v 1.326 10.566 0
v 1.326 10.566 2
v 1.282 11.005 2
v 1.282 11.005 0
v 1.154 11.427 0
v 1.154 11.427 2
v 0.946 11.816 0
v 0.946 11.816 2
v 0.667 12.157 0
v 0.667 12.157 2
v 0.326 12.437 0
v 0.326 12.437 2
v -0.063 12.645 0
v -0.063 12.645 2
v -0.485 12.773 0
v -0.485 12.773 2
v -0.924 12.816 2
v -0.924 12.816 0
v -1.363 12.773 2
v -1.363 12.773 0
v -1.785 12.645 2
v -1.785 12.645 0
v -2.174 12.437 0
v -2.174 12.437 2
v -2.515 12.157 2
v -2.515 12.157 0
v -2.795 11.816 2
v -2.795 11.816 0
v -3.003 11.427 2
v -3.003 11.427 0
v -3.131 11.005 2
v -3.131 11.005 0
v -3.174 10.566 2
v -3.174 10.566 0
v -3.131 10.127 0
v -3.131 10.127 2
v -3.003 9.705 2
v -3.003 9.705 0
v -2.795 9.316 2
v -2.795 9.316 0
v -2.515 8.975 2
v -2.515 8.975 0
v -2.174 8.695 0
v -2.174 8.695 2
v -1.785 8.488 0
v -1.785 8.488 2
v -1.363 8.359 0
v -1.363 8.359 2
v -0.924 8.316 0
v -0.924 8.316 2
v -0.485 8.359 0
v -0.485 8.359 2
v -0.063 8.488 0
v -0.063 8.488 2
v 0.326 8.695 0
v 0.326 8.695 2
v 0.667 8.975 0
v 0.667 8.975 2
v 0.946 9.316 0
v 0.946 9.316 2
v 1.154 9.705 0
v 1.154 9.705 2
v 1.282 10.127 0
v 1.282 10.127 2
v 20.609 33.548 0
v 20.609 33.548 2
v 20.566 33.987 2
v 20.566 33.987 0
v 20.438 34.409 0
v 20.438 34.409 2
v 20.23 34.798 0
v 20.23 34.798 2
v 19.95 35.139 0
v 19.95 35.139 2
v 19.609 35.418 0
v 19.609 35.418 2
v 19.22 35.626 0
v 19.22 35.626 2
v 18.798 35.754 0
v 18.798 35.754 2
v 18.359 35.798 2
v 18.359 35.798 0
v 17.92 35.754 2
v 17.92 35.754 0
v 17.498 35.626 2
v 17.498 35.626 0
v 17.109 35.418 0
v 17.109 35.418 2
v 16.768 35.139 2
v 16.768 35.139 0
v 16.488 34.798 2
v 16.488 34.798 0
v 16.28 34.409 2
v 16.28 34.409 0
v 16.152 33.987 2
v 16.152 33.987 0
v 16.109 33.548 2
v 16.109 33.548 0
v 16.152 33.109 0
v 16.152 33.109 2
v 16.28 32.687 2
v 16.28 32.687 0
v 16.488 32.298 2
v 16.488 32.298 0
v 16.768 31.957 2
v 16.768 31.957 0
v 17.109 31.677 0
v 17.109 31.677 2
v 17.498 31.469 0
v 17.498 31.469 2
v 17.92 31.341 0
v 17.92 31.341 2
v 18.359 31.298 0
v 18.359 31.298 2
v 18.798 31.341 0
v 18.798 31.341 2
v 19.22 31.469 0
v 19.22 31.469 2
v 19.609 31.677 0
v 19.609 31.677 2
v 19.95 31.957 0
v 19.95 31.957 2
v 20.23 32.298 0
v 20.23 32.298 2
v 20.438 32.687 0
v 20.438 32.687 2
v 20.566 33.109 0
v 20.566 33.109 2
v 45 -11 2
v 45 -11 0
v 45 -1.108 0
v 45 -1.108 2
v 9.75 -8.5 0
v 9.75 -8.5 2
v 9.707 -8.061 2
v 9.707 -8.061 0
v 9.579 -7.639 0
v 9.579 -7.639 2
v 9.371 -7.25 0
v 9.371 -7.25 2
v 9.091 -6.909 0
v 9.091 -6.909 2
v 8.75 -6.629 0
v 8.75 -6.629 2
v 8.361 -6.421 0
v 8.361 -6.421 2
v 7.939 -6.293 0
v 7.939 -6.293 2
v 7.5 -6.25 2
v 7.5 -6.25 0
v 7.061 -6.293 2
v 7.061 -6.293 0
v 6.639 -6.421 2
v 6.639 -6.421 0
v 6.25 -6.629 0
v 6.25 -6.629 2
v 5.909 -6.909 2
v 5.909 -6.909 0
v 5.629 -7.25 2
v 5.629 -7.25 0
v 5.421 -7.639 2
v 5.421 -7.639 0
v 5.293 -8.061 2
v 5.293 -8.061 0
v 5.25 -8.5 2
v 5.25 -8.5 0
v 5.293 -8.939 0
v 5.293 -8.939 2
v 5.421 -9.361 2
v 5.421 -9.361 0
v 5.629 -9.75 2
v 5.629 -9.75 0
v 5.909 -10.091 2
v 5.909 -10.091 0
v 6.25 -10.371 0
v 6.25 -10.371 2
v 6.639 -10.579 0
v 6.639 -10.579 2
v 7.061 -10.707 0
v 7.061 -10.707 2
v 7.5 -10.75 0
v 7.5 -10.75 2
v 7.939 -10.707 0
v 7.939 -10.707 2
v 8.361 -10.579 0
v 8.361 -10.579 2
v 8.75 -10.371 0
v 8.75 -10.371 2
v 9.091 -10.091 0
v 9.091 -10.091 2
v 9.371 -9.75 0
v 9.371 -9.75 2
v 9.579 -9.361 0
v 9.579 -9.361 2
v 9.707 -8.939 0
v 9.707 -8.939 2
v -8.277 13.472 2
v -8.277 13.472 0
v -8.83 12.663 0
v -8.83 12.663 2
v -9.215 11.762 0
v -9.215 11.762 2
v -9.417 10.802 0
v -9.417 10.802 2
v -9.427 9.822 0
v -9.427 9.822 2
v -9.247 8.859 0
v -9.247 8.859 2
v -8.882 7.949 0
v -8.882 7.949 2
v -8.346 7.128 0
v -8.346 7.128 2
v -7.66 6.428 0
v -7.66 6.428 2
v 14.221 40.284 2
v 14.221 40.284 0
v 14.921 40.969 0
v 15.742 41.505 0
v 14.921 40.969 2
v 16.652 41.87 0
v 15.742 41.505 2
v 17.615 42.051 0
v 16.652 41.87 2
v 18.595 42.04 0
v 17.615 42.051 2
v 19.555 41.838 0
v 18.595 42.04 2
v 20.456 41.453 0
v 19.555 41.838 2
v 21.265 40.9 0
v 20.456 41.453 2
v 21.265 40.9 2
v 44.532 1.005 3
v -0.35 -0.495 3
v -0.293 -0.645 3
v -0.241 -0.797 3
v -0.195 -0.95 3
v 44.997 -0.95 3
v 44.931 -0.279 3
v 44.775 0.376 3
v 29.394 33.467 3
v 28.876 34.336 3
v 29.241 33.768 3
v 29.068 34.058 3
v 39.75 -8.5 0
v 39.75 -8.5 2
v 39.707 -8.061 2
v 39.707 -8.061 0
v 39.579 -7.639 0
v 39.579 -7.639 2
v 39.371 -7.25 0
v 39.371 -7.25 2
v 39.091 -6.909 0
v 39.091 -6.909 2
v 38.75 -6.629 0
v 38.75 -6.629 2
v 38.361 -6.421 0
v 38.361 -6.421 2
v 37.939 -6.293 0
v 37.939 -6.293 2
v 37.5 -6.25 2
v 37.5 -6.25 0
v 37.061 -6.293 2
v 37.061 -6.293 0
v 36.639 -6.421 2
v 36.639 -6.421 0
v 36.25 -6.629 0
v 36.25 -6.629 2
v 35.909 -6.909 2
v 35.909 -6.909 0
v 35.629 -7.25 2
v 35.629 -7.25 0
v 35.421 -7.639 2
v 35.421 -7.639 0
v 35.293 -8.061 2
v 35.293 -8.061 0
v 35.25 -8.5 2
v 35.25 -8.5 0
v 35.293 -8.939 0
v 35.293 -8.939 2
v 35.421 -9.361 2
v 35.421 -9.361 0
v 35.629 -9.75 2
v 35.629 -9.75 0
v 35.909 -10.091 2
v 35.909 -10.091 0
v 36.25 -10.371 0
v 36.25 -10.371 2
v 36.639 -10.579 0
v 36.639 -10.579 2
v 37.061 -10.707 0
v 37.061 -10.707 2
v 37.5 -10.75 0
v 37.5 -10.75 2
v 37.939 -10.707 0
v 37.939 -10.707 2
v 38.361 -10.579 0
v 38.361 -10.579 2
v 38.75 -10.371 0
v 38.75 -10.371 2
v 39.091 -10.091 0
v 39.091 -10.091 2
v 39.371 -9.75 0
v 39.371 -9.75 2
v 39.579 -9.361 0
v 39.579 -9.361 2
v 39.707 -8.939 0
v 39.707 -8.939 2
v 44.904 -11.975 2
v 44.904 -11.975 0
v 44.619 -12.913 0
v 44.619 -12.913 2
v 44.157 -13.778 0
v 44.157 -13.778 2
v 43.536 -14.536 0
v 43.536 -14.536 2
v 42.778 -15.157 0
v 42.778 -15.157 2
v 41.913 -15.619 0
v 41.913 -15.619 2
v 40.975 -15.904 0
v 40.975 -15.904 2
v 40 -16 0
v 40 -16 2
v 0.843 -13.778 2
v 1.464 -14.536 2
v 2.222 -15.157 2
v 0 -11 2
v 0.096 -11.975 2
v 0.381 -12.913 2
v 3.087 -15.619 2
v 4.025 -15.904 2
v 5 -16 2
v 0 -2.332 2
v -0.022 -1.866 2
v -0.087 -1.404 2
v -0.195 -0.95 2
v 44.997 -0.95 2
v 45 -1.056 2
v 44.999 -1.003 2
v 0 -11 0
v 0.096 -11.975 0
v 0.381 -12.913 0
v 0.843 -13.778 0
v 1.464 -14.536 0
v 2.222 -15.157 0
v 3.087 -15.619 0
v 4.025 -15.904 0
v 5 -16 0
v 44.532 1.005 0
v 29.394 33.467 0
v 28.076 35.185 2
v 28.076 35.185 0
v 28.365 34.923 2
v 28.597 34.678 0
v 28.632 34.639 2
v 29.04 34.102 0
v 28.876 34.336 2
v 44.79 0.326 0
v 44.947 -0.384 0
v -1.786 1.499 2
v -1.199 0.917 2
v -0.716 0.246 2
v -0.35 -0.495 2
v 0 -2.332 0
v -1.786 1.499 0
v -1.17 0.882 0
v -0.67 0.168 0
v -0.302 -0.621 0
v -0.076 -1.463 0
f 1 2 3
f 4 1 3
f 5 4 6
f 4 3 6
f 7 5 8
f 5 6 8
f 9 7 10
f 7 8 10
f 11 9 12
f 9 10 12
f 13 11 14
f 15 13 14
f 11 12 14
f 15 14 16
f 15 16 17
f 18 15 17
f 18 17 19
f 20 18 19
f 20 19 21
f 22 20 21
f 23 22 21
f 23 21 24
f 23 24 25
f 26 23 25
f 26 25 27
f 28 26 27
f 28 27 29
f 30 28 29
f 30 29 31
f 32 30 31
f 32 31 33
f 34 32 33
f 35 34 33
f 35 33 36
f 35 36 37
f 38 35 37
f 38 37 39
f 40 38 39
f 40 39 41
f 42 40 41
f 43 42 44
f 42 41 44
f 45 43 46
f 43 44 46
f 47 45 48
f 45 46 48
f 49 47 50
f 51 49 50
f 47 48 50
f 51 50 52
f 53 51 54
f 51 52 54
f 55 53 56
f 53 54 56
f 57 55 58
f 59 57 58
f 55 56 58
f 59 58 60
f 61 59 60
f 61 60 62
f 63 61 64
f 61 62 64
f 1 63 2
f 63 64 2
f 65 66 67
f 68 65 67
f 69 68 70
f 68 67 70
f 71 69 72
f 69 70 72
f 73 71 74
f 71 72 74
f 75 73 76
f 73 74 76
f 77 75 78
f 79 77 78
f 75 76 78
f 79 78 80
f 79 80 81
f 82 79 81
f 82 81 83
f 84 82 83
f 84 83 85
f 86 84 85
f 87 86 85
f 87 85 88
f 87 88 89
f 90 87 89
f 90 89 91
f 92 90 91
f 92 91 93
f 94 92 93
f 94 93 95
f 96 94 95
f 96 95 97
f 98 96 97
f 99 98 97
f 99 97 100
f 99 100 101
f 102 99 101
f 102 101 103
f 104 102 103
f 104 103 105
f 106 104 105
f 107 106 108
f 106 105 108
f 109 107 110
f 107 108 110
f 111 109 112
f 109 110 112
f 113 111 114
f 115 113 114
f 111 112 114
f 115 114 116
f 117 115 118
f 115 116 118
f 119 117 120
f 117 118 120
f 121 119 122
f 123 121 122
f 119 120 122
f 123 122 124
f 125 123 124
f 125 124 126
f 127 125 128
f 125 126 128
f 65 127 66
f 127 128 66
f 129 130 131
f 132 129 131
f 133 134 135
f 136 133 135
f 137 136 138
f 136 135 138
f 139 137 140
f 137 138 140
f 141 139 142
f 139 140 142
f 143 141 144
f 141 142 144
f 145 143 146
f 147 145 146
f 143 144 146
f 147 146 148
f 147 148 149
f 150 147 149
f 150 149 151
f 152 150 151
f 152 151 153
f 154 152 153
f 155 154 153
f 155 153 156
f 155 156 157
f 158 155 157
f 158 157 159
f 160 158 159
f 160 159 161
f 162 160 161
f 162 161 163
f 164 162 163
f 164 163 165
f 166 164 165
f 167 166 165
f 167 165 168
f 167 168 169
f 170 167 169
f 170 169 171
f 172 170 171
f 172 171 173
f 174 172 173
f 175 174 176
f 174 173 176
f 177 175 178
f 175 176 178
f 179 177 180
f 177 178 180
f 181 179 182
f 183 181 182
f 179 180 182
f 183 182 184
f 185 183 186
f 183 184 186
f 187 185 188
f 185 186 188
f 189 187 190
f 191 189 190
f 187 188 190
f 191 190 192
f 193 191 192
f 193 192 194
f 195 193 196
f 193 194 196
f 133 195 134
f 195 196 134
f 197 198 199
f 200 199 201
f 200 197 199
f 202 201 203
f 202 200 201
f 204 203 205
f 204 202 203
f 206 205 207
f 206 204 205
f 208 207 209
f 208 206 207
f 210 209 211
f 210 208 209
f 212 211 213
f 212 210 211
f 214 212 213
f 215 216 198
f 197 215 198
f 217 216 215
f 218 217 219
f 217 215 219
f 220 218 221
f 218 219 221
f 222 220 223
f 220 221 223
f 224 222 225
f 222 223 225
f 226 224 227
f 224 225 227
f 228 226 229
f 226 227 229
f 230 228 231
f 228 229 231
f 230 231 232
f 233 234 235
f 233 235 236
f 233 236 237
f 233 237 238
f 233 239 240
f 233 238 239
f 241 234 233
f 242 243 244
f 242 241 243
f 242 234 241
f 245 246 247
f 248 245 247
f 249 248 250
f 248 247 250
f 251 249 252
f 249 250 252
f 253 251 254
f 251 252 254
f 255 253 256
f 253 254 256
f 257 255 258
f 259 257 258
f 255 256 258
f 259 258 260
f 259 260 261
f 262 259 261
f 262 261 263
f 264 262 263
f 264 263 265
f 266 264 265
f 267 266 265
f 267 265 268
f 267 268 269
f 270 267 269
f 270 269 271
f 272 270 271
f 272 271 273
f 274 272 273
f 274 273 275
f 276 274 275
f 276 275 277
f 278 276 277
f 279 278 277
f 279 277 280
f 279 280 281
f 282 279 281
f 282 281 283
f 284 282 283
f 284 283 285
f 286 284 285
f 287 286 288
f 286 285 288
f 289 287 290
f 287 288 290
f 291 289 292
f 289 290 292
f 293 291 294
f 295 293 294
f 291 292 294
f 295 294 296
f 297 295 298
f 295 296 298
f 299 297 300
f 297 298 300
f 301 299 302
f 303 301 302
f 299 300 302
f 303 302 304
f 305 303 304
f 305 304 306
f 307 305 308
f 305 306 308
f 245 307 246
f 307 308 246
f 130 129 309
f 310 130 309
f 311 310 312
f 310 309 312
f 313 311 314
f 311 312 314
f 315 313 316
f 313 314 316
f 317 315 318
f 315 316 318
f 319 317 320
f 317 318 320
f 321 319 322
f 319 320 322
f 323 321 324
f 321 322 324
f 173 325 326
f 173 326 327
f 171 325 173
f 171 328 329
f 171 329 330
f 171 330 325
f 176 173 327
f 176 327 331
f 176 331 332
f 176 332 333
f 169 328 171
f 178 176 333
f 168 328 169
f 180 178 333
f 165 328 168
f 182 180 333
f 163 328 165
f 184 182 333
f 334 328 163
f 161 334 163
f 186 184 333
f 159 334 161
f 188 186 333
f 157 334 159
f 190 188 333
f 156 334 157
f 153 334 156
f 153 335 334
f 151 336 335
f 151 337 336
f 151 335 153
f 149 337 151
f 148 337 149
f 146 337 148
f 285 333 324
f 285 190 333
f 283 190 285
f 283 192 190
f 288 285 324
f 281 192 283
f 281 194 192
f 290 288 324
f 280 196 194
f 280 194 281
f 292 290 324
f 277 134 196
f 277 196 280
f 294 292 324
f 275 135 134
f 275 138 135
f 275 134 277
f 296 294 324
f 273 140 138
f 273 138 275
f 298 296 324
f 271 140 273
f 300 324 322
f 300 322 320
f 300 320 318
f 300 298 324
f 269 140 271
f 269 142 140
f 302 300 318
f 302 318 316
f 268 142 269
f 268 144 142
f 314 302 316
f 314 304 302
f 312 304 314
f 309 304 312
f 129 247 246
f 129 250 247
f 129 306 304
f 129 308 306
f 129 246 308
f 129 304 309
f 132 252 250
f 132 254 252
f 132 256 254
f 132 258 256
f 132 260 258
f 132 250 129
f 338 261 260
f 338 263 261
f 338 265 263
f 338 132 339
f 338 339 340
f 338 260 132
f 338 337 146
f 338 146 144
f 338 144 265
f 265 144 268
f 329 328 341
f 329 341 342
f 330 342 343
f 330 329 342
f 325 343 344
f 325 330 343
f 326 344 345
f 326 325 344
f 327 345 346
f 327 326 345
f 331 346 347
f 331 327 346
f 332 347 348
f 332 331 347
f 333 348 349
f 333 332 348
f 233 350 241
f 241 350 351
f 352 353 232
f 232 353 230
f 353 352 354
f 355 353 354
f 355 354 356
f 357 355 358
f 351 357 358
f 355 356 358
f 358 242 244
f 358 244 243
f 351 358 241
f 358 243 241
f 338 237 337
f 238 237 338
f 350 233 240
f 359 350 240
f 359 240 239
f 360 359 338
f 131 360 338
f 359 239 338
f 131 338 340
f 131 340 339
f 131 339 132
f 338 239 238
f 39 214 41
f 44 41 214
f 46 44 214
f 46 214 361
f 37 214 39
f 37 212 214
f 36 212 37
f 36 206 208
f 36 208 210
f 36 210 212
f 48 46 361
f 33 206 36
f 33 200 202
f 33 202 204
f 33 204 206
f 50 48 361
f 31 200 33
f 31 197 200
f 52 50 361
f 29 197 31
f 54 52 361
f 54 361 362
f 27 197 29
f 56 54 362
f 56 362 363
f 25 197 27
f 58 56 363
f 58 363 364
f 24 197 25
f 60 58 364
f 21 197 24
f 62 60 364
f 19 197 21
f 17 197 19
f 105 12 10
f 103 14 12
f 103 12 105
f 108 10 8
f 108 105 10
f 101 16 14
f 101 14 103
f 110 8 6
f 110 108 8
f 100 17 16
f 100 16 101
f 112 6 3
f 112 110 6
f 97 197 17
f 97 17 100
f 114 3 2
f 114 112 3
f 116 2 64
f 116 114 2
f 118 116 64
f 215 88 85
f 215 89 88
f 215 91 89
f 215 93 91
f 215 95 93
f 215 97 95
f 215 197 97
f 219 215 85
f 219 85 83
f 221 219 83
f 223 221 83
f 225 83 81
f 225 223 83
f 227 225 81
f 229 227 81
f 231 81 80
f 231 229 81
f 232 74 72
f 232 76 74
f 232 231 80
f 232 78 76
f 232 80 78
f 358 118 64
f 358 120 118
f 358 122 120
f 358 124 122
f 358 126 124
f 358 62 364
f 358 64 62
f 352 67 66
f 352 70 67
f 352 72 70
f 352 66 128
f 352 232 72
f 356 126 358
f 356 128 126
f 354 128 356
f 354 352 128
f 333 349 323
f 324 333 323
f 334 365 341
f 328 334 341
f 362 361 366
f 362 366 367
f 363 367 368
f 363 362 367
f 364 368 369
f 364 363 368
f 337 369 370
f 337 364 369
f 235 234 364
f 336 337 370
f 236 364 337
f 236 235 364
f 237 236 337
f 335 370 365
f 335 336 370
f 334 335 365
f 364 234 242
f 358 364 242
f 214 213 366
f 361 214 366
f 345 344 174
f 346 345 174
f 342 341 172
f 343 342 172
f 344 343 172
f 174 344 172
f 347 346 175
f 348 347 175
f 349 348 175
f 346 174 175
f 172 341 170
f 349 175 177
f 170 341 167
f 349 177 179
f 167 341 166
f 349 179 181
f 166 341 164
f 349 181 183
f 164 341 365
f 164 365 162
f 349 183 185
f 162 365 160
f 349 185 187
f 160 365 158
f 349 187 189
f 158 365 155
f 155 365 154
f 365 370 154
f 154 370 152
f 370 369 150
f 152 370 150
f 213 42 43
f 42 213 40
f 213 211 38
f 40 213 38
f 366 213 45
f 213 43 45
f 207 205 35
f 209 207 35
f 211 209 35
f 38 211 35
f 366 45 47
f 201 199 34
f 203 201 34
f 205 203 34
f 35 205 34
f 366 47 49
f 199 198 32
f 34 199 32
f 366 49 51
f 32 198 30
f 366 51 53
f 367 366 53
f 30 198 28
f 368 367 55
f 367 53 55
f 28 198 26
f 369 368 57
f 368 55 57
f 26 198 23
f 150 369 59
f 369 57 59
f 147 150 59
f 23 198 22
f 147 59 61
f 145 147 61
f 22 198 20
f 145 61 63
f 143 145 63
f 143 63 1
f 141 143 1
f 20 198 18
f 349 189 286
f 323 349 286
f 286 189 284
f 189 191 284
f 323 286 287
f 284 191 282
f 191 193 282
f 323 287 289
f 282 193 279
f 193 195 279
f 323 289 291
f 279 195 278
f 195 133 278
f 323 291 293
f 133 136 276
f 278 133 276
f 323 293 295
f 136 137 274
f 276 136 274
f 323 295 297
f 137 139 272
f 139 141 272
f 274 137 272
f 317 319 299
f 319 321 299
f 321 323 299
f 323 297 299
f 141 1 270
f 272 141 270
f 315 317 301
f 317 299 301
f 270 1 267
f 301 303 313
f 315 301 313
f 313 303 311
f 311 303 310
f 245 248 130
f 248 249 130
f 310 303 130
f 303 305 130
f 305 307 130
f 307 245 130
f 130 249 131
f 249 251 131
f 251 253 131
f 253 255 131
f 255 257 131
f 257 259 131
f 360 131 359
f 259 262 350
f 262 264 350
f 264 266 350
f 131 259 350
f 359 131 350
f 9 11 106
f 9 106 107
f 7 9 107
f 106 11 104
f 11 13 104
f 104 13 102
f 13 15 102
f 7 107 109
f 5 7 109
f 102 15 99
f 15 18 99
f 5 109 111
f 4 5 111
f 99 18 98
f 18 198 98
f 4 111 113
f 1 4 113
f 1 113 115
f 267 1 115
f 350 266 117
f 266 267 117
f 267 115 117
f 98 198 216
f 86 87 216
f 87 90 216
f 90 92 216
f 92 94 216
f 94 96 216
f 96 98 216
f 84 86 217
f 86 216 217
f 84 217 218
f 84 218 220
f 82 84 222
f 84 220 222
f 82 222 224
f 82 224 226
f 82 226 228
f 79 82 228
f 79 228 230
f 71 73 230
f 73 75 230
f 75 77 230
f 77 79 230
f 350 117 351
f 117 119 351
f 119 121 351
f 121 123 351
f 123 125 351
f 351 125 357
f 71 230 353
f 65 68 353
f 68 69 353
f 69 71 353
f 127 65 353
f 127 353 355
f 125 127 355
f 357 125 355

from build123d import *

# Parameters (mm, degrees)
EXTRUDE_1_DEPTH     = 3
SKETCH_2_R          = 2.25
CUT_EXTRUDE_1_DEPTH = 3
FILLET_1_R          = 5
SKETCH_3_W          = 46
SKETCH_3_H          = 15.05
CUT_EXTRUDE_2_DEPTH = 1


with BuildPart() as part:
    # ｽｹｯﾁ1 → ﾎﾞｽ - 押し出し1 (new body)
    with BuildSketch(Plane.XY):
        Polygon((17.434775789, 44.113814086), (-11.490666647, 9.641814145), (0, 0), (0, -16), (45, -16), (45, 0), (28.925442436, 34.47199994), align=None)
    extrude(amount=EXTRUDE_1_DEPTH)

    # ｽｹｯﾁ2 → ｶｯﾄ - 押し出し1 (cut)
    with BuildSketch(Plane.XY.offset(3)):
        with Locations((7.5, -8.5)):
            Circle(SKETCH_2_R)
        with Locations((-0.924426251, 10.566240396)):
            Circle(SKETCH_2_R)
        with Locations((18.35920204, 33.54757369)):
            Circle(SKETCH_2_R)
        with Locations((37.5, -8.5)):
            Circle(SKETCH_2_R)
    extrude(amount=-CUT_EXTRUDE_1_DEPTH, mode=Mode.SUBTRACT)

    # ﾌｨﾚｯﾄ1
    fillet_1_edges = [part.edges().sort_by_distance(p)[0] for p in [
        (17.434775789, 44.113814086, 1.5),
        (28.925442436, 34.47199994, 1.5),
        (45, 0, 1.5),
        (45, -16, 1.5),
        (0, -16, 1.5),
        (0, 0, 1.5),
        (-11.490666647, 9.641814145, 1.5),
    ]]
    fillet(fillet_1_edges, radius=FILLET_1_R)

    # ｽｹｯﾁ3 → ｶｯﾄ - 押し出し2 (cut)
    with BuildSketch(Plane.XY.offset(3)):
        Polygon((17.434775789, 44.113814086), (-12.133454256, 8.875769702), (-0.604485388, -0.798183824), (28.963744658, 34.43986056), align=None)
        with Locations((22, -8.475)):
            Rectangle(SKETCH_3_W, SKETCH_3_H)
    extrude(amount=-CUT_EXTRUDE_2_DEPTH, mode=Mode.SUBTRACT)


solid = part.part
